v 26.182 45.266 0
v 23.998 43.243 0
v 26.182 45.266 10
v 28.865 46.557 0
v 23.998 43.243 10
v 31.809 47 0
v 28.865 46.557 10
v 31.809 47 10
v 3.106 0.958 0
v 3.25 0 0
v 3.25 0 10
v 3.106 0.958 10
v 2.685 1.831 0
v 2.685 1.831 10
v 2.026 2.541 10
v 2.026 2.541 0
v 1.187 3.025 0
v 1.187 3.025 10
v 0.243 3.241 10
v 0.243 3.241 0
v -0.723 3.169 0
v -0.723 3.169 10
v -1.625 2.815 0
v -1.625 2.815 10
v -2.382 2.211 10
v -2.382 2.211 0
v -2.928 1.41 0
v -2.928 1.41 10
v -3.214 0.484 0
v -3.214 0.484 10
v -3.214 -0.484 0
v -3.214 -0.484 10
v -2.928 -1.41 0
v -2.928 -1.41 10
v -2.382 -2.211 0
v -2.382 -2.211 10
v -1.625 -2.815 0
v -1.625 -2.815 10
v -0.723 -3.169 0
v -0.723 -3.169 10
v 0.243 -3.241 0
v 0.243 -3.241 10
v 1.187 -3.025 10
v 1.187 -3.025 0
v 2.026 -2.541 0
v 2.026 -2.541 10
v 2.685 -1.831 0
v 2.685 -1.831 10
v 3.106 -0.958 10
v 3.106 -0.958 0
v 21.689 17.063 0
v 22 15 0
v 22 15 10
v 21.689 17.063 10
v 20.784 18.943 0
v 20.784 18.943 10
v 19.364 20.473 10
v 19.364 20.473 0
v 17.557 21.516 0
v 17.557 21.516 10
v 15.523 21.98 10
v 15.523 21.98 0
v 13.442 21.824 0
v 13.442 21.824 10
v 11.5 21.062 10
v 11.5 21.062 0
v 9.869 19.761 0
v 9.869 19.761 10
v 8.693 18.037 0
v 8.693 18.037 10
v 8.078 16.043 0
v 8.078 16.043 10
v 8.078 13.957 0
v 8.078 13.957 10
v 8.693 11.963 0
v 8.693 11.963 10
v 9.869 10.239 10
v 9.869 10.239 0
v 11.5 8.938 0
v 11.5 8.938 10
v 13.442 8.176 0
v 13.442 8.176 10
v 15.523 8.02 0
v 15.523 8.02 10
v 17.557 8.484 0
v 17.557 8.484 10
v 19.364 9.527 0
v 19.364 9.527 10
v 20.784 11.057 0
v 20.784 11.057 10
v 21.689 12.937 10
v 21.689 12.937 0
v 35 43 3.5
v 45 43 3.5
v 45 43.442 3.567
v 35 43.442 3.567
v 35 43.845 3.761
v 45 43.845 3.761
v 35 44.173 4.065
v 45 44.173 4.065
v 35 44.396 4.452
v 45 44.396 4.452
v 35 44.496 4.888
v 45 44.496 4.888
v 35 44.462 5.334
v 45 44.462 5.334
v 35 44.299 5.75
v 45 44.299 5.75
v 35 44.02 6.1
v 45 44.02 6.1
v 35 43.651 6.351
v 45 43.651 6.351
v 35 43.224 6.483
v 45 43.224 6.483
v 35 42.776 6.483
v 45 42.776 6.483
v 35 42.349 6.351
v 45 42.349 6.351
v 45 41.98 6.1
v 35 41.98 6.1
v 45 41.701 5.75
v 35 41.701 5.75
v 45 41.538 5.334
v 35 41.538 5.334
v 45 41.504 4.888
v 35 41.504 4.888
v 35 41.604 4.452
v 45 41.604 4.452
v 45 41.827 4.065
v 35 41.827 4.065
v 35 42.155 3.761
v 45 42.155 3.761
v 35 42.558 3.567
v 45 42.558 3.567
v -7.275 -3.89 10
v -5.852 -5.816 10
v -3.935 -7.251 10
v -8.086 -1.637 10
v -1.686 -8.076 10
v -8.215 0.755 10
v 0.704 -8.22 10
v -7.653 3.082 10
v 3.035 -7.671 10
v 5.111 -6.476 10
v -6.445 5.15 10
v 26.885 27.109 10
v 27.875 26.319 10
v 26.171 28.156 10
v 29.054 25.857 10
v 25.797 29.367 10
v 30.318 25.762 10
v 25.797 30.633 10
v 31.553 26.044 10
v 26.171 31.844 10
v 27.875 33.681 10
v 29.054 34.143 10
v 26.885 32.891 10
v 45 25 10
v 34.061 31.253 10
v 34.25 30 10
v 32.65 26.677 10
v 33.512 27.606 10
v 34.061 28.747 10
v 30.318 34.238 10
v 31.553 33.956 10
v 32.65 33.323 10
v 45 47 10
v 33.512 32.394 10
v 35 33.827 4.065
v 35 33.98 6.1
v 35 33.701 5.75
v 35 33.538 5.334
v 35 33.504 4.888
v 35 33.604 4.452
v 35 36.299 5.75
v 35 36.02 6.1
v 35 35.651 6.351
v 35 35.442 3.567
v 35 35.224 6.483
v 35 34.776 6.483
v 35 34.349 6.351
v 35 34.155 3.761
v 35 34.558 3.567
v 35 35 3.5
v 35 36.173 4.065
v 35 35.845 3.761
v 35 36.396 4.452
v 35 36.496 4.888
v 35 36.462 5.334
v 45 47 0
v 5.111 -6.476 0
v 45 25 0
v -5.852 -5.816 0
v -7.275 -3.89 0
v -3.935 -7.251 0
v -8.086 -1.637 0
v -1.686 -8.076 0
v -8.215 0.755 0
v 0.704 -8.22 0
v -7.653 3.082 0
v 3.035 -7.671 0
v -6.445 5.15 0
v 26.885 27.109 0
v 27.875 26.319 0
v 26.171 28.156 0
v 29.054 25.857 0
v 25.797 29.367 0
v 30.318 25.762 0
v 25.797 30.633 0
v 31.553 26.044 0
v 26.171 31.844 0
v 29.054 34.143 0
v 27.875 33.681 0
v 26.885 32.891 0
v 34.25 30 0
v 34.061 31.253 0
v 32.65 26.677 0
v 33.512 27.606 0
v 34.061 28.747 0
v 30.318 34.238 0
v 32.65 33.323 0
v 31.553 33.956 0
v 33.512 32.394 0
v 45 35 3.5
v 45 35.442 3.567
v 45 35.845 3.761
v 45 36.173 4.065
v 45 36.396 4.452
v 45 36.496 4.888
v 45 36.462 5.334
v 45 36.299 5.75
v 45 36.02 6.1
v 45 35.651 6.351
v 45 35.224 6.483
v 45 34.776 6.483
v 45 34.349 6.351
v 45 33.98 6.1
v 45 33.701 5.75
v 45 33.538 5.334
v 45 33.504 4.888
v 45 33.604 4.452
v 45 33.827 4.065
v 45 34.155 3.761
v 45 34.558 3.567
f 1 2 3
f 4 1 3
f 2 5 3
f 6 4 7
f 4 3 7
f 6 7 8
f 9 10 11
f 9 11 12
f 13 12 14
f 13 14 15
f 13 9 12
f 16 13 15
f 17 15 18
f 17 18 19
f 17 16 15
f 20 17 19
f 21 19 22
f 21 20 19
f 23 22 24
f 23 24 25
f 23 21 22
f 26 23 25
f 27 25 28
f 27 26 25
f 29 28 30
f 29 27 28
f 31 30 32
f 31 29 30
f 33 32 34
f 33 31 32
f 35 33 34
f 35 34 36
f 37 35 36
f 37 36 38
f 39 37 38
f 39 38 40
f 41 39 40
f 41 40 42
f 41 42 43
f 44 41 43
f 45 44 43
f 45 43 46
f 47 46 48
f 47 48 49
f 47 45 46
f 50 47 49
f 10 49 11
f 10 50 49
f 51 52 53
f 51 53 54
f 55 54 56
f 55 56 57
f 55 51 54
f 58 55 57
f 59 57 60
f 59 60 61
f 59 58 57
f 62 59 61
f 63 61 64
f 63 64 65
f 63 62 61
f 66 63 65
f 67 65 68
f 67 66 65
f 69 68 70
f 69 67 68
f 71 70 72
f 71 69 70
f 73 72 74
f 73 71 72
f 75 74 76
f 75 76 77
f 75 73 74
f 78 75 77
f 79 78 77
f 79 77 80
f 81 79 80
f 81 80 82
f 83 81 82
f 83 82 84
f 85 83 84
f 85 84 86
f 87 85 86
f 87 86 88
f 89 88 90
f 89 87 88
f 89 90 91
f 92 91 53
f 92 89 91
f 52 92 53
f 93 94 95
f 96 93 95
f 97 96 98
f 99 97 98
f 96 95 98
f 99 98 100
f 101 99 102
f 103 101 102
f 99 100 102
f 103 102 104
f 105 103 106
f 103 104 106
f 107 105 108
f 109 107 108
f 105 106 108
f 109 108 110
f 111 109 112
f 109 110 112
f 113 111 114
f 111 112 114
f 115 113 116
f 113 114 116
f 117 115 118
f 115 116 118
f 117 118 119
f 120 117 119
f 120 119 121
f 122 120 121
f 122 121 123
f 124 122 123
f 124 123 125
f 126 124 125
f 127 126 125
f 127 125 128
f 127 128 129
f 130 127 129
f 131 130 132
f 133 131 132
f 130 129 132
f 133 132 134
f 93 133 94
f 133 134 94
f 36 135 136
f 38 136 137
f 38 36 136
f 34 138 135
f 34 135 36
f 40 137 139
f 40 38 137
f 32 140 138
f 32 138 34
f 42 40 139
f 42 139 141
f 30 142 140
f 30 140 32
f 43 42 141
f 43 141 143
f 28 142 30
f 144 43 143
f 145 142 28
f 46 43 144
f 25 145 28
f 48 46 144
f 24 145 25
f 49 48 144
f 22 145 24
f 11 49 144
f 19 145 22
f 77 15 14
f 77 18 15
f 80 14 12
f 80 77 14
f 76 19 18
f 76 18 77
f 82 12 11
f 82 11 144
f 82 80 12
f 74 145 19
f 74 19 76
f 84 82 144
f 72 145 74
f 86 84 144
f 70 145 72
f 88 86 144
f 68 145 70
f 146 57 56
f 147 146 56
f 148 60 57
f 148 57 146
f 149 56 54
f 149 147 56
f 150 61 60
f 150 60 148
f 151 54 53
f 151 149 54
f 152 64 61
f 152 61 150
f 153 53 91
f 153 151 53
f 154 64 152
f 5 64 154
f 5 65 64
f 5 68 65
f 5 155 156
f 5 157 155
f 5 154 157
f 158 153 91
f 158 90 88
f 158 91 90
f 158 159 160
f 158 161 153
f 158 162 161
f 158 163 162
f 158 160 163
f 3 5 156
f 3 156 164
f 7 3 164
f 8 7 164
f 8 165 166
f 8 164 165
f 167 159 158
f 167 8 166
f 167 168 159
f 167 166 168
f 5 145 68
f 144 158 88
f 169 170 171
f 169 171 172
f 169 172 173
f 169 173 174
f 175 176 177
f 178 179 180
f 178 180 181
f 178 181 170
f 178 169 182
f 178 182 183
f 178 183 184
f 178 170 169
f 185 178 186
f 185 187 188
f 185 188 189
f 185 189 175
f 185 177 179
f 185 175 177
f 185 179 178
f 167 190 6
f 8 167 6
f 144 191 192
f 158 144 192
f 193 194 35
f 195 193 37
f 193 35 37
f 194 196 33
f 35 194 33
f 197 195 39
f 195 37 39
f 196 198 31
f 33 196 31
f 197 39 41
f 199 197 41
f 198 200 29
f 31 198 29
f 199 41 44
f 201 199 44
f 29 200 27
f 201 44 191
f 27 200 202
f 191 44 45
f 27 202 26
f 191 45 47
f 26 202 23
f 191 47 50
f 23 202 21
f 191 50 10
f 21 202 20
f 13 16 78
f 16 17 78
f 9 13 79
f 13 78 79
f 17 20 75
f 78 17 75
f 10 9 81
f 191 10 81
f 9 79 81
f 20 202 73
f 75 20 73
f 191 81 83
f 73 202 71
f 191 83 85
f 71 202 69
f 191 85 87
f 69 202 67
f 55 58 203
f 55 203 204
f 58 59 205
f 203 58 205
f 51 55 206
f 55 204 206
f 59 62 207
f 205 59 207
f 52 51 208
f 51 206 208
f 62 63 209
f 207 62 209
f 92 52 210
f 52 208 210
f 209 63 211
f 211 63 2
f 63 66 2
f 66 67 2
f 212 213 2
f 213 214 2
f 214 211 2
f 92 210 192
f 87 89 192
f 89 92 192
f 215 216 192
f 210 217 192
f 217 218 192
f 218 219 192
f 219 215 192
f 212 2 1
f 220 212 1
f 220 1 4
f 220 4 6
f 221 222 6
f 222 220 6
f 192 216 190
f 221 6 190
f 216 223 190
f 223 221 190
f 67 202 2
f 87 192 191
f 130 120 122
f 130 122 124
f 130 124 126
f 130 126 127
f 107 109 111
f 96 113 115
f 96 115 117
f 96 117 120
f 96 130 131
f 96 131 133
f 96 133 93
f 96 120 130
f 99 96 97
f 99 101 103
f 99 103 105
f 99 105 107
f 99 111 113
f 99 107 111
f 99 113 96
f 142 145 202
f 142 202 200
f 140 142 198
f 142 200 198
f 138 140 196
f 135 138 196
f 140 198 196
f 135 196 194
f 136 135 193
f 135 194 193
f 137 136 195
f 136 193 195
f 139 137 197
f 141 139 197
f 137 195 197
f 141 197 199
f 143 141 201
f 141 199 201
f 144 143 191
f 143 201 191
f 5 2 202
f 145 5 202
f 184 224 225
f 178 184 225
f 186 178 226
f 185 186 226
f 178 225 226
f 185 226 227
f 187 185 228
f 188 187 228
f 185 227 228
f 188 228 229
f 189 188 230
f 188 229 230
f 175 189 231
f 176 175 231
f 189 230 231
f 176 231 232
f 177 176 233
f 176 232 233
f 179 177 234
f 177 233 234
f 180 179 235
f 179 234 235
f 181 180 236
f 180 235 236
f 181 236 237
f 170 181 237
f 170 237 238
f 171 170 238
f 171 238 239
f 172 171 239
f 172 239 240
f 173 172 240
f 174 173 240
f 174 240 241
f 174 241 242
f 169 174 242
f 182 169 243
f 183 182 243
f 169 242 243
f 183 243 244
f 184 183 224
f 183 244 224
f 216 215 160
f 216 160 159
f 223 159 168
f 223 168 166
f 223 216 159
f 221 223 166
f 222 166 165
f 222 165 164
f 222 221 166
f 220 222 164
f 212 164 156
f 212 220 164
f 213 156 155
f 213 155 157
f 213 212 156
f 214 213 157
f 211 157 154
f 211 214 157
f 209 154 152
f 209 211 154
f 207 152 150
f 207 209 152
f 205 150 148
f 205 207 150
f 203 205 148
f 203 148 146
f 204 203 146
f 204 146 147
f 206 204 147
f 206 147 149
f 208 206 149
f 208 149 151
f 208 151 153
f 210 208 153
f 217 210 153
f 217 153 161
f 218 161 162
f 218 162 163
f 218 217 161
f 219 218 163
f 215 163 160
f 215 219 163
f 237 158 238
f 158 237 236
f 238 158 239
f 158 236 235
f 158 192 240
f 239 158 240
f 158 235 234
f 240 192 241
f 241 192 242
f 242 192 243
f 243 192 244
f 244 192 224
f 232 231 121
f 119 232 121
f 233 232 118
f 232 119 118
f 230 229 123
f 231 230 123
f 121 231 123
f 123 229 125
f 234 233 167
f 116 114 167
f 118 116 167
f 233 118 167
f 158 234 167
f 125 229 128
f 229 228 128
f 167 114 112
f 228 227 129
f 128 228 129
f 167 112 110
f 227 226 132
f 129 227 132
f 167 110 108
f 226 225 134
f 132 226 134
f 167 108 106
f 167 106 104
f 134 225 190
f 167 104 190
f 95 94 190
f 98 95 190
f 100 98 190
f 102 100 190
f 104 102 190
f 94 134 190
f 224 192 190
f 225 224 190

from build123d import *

# Parameters (mm, degrees)
SKETCH1_R           = 3.25
SKETCH1_R_2         = 4.25
SKETCH1_R_3         = 7
BOSS_EXTRUDE1_DEPTH = 10
SKETCH2_R           = 1.5
CUT_EXTRUDE1_DEPTH  = 10
FILLET1_R           = 10


with BuildPart() as part:
    # Sketch1 → Boss-Extrude1 (new body)
    with BuildSketch(Plane.XY):
        with BuildLine():
            Line((5.110545705, -6.47648227), (45, 25))
            Line((45, 25), (45, 47))
            Line((45, 47), (27, 47))
            Line((27, 47), (-6.444784556, 5.150461341))
            ThreePointArc((-6.444784556, 5.150461341), (-5.851623942, -5.815582279), (5.110545705, -6.47648227))
        make_face()
        Circle(SKETCH1_R, mode=Mode.SUBTRACT)
        with Locations((30, 30)):
            Circle(SKETCH1_R_2, mode=Mode.SUBTRACT)
        with Locations((15, 15)):
            Circle(SKETCH1_R_3, mode=Mode.SUBTRACT)
    extrude(amount=BOSS_EXTRUDE1_DEPTH)

    # Sketch2 → Cut-Extrude1 (cut)
    with BuildSketch(Plane(origin=(45, 0, 0), x_dir=(0, 0, -1), z_dir=(1, 0, 0))):
        with Locations((-5, 43)):
            Circle(SKETCH2_R)
        with Locations((-5, 35)):
            Circle(SKETCH2_R)
    extrude(amount=-CUT_EXTRUDE1_DEPTH, mode=Mode.SUBTRACT)

    # Fillet1
    fillet1_edges = [part.edges().sort_by_distance(p)[0] for p in [
        (27, 47, 5),
    ]]
    fillet(fillet1_edges, radius=FILLET1_R)


solid = part.part
